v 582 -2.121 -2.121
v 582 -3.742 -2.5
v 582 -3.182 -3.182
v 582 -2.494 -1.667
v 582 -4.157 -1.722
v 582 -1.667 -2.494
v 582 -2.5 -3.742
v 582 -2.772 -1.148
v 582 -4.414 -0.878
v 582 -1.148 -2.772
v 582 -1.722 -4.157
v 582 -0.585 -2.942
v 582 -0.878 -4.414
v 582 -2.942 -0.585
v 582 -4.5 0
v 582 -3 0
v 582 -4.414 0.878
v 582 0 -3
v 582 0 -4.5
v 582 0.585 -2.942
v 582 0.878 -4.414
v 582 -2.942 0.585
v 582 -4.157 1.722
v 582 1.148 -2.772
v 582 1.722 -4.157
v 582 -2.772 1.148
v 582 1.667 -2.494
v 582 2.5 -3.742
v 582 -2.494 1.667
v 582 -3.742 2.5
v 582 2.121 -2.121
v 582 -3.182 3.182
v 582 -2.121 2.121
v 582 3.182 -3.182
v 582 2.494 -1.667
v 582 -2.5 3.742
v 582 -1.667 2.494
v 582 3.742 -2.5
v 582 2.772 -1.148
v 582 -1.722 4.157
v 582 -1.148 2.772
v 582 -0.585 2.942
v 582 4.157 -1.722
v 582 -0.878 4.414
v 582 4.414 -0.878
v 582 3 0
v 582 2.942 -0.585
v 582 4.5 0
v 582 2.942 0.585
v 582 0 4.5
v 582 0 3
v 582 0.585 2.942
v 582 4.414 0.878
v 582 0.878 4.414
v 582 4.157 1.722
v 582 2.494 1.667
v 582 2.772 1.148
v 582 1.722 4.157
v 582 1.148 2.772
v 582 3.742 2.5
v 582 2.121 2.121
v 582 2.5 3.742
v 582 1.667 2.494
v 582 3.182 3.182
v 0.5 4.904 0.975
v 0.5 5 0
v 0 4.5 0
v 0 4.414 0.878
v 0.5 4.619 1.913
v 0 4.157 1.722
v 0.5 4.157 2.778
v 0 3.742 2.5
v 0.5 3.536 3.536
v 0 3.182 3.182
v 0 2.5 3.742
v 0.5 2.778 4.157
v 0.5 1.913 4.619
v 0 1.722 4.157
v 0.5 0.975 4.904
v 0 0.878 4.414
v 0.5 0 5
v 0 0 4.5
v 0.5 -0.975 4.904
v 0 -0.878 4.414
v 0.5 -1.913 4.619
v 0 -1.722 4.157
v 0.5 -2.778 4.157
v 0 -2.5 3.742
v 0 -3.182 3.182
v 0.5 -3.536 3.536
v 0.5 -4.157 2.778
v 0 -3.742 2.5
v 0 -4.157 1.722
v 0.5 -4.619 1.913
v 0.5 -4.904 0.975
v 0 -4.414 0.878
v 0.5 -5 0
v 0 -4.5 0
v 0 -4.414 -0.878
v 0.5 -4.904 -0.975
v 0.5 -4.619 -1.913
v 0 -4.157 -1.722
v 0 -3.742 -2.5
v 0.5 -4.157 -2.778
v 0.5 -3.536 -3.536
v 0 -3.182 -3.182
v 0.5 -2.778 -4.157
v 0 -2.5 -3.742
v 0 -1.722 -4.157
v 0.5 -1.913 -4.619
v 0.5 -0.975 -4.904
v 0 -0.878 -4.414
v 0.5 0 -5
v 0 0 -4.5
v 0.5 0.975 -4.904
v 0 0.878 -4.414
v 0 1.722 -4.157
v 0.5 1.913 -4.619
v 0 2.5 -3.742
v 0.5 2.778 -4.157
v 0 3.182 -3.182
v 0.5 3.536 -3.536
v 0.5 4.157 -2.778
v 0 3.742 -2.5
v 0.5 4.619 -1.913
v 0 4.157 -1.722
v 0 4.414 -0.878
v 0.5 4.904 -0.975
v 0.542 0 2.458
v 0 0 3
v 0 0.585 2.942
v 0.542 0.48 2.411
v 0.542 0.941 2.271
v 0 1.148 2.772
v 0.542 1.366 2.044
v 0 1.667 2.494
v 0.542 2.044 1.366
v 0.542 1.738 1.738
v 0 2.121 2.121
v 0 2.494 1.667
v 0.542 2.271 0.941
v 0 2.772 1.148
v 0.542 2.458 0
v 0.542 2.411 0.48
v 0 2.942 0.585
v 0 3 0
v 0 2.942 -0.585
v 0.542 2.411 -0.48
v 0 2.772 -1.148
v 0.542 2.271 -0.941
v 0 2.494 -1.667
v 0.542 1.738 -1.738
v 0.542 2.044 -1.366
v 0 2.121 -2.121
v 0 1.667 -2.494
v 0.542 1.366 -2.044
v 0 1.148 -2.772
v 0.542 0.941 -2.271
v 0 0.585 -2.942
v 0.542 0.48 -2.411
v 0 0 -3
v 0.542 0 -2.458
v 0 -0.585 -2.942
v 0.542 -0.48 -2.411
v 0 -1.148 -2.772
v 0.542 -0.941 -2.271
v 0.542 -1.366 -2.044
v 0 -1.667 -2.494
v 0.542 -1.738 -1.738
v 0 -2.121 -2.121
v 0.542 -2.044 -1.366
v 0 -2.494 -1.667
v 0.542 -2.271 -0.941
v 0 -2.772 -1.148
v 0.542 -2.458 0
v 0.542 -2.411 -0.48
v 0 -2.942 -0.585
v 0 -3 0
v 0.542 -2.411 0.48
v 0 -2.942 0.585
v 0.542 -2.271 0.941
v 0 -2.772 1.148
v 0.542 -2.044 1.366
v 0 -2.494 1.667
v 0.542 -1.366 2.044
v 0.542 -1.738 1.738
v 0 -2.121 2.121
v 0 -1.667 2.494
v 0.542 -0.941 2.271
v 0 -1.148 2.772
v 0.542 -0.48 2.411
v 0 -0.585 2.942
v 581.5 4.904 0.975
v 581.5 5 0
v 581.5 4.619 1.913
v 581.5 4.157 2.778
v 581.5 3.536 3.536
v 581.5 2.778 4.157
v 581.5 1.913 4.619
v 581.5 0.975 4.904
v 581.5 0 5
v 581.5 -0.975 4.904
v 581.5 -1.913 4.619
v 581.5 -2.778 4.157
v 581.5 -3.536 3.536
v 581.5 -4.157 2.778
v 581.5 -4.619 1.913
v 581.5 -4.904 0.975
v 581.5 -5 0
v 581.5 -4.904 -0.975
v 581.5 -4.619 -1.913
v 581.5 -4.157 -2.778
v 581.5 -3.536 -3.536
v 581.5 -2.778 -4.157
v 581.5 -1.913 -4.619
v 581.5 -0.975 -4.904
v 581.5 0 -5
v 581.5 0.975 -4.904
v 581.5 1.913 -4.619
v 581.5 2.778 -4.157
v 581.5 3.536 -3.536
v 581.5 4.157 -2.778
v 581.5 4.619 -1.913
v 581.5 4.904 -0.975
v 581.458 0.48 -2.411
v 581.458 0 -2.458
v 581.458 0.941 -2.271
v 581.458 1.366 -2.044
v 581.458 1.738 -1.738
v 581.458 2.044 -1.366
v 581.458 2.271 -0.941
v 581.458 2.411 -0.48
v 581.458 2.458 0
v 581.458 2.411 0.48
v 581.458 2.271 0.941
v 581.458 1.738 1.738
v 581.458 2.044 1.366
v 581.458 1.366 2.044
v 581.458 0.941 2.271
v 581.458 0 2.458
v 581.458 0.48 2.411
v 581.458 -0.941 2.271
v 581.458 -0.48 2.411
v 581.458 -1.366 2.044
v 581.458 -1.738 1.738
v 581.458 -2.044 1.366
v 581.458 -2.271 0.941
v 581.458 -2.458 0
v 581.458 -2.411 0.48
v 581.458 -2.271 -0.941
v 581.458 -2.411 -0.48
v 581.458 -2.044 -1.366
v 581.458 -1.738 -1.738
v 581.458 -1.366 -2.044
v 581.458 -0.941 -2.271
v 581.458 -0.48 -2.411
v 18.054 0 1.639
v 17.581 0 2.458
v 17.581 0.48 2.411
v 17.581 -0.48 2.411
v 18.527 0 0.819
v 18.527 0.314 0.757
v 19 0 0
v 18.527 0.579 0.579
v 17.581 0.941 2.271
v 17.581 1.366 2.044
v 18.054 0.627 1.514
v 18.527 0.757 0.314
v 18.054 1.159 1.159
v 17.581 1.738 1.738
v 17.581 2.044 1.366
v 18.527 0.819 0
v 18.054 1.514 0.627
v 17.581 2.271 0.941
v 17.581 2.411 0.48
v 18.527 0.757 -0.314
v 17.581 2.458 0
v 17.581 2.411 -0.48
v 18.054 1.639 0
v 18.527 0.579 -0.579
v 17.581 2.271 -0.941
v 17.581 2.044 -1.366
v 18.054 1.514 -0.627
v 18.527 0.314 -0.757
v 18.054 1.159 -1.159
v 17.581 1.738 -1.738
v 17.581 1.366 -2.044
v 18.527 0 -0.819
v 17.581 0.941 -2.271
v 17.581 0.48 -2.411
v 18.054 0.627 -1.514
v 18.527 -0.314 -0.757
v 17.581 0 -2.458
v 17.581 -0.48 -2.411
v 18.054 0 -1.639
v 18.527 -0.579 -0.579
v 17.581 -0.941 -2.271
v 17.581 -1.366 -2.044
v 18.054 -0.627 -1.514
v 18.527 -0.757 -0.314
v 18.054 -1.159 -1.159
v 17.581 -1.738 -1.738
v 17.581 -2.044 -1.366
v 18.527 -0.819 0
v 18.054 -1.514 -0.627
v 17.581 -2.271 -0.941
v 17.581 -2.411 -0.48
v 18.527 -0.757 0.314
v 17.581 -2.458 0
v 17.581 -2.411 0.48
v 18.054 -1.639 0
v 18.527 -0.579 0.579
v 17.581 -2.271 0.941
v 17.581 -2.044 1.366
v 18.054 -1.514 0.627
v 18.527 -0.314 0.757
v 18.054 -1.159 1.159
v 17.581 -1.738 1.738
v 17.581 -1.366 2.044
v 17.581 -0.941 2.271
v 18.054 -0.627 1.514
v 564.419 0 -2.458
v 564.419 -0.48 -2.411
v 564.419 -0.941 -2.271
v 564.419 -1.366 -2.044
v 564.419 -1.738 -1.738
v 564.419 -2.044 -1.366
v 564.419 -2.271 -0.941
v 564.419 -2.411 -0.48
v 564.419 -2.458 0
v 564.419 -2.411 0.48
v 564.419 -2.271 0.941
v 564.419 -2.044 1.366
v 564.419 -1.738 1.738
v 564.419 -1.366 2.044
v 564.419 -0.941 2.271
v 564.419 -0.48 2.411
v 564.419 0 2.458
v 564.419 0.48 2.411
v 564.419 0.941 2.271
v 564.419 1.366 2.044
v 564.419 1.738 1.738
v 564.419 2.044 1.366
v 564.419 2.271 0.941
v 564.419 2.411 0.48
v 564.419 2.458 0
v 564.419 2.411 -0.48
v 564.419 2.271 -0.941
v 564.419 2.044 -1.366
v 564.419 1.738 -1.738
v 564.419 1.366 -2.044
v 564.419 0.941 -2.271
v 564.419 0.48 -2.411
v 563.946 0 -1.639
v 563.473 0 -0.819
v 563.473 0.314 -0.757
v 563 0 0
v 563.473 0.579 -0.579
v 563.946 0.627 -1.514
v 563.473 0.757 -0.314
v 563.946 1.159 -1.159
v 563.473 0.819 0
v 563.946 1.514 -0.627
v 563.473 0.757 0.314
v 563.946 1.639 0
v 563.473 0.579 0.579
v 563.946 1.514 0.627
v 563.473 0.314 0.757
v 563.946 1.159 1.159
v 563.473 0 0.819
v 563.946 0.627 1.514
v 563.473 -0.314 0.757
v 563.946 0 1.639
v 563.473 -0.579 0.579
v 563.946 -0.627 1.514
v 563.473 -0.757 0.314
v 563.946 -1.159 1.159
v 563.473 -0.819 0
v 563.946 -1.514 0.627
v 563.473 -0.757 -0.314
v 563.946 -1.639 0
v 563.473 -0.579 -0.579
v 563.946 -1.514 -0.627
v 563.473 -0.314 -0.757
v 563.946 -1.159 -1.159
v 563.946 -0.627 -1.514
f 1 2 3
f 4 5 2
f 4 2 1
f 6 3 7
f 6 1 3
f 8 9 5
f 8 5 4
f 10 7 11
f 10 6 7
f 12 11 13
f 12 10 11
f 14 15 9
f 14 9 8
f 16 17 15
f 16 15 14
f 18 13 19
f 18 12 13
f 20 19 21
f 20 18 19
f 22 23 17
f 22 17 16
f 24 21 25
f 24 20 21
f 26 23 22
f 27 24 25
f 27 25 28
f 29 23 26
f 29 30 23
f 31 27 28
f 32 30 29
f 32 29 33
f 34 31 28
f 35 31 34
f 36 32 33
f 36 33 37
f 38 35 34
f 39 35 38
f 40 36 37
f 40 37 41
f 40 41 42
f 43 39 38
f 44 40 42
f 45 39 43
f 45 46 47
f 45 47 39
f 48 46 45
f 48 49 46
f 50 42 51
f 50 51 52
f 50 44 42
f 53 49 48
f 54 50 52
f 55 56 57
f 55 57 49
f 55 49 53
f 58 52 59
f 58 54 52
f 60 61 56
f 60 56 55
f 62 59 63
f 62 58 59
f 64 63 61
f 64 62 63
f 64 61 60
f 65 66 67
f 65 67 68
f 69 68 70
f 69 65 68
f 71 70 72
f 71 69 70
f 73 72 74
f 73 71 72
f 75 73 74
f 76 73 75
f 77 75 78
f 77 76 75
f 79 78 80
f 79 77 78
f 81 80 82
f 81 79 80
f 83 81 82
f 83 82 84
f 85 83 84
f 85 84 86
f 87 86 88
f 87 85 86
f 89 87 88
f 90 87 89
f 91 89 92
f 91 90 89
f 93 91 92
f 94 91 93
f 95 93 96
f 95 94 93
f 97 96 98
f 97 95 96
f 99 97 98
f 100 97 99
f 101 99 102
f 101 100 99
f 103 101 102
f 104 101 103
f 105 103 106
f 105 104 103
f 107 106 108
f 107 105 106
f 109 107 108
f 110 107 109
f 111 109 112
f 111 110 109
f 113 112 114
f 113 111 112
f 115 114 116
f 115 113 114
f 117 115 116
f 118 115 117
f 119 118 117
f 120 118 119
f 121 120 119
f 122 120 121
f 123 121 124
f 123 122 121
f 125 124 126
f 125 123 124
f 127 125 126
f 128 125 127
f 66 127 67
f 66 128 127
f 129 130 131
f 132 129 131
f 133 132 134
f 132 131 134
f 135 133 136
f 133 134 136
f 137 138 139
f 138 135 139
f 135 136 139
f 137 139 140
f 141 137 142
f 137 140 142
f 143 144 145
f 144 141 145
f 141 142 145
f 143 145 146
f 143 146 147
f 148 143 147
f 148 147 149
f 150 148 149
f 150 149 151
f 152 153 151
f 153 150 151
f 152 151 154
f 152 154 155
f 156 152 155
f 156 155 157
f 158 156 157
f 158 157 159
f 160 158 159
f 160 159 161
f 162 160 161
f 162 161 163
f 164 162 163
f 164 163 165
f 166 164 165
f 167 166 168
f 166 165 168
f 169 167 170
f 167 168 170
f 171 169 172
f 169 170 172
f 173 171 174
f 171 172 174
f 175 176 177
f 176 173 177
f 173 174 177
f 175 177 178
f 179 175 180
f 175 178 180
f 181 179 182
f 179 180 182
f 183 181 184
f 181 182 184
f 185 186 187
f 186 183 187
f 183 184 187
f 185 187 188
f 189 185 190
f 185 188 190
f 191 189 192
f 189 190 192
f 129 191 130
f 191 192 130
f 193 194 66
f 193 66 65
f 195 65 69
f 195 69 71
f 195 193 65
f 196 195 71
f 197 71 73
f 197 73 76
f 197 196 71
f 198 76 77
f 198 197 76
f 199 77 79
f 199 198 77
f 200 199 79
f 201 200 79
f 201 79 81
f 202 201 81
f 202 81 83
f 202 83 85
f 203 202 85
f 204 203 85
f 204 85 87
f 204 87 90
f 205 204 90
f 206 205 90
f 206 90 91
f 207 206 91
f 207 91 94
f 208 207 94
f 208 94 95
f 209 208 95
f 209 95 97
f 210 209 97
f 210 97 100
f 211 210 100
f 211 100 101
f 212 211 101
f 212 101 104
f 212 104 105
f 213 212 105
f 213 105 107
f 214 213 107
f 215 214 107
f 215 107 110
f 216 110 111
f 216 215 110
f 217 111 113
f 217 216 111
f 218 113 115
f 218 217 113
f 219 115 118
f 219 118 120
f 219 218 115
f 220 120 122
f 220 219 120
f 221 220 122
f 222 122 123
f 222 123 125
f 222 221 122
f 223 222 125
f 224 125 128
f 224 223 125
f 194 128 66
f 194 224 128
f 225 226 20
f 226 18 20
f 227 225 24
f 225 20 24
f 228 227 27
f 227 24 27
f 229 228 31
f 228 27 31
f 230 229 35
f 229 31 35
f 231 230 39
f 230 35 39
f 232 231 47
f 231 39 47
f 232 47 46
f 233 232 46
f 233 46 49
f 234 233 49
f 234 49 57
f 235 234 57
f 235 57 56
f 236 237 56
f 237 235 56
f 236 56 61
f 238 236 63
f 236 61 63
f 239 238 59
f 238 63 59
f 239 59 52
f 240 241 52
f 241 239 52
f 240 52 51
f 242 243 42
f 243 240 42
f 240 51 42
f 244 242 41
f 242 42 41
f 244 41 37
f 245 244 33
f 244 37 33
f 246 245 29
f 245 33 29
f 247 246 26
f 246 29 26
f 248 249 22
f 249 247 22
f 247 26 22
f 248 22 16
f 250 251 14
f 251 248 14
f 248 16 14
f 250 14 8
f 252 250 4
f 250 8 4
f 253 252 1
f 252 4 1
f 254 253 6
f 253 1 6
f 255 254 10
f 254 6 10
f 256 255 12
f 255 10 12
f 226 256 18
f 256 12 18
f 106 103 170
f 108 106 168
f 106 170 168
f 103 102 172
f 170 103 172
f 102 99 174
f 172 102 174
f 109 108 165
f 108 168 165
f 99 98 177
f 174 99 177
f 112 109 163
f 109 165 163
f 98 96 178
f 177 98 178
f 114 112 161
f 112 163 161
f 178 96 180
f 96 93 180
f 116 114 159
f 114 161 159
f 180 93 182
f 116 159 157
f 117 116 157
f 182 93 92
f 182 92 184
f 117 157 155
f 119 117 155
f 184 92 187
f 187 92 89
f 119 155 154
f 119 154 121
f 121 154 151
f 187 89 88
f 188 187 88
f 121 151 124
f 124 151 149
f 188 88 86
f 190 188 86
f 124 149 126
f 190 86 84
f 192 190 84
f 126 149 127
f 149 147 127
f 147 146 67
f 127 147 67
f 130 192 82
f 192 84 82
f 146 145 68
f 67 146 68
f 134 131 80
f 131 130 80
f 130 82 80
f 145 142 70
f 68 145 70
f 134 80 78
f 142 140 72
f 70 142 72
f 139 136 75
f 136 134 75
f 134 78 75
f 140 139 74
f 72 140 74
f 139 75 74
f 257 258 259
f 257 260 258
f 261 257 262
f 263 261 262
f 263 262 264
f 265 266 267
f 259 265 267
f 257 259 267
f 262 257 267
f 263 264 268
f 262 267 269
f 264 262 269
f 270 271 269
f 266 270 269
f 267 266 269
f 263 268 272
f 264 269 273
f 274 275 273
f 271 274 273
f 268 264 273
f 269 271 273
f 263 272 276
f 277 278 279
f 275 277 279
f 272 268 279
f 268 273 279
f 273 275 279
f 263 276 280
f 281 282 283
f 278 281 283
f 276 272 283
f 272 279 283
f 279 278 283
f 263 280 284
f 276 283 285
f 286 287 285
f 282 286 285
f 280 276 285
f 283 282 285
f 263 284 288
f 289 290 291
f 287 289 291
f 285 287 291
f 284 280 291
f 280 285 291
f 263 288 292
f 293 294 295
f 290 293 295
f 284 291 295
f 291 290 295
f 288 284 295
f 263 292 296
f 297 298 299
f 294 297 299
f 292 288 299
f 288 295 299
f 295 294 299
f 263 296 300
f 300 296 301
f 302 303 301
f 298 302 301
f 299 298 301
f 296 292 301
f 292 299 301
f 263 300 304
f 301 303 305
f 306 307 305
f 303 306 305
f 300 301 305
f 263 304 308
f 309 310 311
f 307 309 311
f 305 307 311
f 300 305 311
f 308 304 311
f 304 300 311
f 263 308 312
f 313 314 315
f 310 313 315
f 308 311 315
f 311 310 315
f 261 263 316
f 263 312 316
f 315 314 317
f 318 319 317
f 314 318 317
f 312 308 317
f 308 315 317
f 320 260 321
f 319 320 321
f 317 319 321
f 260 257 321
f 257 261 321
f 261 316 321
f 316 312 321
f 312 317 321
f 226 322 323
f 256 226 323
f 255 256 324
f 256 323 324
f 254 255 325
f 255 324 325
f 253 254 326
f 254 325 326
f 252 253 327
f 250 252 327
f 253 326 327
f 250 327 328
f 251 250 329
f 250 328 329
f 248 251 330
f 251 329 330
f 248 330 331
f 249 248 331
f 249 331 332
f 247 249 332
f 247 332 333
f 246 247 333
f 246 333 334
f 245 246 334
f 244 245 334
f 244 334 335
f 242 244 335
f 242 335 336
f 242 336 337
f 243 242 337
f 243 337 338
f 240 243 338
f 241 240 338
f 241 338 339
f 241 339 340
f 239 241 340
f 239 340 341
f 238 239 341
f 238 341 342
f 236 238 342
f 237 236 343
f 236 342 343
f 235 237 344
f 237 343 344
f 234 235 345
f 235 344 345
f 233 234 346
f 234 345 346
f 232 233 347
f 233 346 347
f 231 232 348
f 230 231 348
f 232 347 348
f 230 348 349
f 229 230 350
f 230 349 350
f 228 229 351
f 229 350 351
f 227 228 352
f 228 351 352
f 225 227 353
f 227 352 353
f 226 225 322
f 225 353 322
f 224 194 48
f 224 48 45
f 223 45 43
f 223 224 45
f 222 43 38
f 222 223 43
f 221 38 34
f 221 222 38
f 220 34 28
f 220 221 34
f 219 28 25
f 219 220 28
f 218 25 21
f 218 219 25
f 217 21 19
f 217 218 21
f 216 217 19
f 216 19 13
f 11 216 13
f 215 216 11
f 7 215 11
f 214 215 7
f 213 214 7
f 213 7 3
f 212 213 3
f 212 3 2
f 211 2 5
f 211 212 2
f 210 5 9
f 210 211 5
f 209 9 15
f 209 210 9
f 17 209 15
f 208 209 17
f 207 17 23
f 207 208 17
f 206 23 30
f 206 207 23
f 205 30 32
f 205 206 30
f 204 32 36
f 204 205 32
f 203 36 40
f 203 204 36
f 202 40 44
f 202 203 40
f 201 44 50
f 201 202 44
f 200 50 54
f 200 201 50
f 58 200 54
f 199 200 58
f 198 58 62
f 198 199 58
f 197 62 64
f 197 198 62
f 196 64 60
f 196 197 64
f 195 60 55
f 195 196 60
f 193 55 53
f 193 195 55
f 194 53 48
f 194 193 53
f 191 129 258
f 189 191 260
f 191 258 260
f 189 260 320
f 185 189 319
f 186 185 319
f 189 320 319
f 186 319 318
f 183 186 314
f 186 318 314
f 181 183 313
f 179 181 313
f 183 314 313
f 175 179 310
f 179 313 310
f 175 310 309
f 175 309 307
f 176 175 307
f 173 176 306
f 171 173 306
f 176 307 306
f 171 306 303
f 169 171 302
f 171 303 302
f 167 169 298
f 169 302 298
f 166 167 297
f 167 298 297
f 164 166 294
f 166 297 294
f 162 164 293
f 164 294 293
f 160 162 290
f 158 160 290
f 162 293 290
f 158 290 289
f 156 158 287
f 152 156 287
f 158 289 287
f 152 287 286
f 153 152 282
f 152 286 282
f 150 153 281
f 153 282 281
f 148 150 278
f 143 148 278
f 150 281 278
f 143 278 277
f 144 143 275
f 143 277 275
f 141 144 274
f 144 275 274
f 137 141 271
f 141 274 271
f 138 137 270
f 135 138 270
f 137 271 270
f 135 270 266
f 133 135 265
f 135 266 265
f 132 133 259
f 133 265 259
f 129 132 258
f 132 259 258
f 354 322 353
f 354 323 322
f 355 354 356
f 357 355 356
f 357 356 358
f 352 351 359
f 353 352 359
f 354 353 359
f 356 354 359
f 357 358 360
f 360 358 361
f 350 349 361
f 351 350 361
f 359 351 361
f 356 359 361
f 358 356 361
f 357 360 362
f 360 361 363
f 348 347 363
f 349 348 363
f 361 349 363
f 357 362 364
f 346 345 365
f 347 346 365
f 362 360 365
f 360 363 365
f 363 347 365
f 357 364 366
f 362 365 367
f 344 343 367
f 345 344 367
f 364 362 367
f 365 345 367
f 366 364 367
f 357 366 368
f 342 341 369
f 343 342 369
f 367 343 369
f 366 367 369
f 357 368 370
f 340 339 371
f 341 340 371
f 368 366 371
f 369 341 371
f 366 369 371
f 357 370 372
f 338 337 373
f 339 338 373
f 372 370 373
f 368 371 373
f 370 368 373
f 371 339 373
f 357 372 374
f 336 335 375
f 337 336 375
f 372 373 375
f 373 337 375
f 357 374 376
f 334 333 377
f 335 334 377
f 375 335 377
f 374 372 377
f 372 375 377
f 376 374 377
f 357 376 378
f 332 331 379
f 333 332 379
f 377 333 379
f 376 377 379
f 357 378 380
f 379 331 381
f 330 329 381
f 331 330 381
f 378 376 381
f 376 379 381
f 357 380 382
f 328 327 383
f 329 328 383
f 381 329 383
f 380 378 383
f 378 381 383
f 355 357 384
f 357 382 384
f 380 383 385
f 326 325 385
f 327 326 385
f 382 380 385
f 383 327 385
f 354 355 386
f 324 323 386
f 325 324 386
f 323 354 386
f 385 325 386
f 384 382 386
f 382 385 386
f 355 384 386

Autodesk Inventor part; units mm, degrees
ref_plane "YZ Plane" through (0, 0, 0) normal (1, 0, 0) x (0, 1, 0)
ref_plane "XZ Plane" through (0, 0, 0) normal (0, 1, 0) x (-1, 0, 0)
ref_plane "XY Plane" through (0, 0, 0) normal (0, 0, 1) x (1, 0, 0)
sketch "Sketch_1" plane through (0, 0, 0) normal (0, 0, 1) x (1, 0, 0)
  line L0 (582, 0) -> (0, 0)
  line L1 (0, 0) -> (0, 4.5)
  line L2 (0, 4.5) -> (0.5, 5)
  line L3 (0.5, 5) -> (581.5, 5)
  line L4 (581.5, 5) -> (582, 4.5)
  line L5 (582, 4.5) -> (582, 0)
  line L6 (582, 0) -> (0, 0)
revolve "Revolution1" add sketch "Sketch_1" angle 360 about axis through (582, 0, 0) along (1, 0, 0)
sketch "Sketch2" plane through (0, 0, 0) normal (-1, 0, 0) x (0, 0, 1)
  point P0 (0, 0)
hole "Hole1" at (0, 0, 0) direction (1, 0, 0) diameter 4.917 depth 17.5806 tip angle 120 countersink diameter 6 countersink angle 90 thread size "M6x1" class "6H" standard "ISO Metric profile"
sketch "Sketch3" plane through (582, 0, 0) normal (1, 0, 0) x (0, 0, -1)
  point P0 (0, 0)
hole "Hole2" at (582, 0, 0) direction (-1, 0, 0) diameter 4.917 depth 17.5806 tip angle 120 countersink diameter 6 countersink angle 90 thread size "M6x1" class "6H" standard "ISO Metric profile"
properties part number "PSSFGW10-582-M6-N6"
